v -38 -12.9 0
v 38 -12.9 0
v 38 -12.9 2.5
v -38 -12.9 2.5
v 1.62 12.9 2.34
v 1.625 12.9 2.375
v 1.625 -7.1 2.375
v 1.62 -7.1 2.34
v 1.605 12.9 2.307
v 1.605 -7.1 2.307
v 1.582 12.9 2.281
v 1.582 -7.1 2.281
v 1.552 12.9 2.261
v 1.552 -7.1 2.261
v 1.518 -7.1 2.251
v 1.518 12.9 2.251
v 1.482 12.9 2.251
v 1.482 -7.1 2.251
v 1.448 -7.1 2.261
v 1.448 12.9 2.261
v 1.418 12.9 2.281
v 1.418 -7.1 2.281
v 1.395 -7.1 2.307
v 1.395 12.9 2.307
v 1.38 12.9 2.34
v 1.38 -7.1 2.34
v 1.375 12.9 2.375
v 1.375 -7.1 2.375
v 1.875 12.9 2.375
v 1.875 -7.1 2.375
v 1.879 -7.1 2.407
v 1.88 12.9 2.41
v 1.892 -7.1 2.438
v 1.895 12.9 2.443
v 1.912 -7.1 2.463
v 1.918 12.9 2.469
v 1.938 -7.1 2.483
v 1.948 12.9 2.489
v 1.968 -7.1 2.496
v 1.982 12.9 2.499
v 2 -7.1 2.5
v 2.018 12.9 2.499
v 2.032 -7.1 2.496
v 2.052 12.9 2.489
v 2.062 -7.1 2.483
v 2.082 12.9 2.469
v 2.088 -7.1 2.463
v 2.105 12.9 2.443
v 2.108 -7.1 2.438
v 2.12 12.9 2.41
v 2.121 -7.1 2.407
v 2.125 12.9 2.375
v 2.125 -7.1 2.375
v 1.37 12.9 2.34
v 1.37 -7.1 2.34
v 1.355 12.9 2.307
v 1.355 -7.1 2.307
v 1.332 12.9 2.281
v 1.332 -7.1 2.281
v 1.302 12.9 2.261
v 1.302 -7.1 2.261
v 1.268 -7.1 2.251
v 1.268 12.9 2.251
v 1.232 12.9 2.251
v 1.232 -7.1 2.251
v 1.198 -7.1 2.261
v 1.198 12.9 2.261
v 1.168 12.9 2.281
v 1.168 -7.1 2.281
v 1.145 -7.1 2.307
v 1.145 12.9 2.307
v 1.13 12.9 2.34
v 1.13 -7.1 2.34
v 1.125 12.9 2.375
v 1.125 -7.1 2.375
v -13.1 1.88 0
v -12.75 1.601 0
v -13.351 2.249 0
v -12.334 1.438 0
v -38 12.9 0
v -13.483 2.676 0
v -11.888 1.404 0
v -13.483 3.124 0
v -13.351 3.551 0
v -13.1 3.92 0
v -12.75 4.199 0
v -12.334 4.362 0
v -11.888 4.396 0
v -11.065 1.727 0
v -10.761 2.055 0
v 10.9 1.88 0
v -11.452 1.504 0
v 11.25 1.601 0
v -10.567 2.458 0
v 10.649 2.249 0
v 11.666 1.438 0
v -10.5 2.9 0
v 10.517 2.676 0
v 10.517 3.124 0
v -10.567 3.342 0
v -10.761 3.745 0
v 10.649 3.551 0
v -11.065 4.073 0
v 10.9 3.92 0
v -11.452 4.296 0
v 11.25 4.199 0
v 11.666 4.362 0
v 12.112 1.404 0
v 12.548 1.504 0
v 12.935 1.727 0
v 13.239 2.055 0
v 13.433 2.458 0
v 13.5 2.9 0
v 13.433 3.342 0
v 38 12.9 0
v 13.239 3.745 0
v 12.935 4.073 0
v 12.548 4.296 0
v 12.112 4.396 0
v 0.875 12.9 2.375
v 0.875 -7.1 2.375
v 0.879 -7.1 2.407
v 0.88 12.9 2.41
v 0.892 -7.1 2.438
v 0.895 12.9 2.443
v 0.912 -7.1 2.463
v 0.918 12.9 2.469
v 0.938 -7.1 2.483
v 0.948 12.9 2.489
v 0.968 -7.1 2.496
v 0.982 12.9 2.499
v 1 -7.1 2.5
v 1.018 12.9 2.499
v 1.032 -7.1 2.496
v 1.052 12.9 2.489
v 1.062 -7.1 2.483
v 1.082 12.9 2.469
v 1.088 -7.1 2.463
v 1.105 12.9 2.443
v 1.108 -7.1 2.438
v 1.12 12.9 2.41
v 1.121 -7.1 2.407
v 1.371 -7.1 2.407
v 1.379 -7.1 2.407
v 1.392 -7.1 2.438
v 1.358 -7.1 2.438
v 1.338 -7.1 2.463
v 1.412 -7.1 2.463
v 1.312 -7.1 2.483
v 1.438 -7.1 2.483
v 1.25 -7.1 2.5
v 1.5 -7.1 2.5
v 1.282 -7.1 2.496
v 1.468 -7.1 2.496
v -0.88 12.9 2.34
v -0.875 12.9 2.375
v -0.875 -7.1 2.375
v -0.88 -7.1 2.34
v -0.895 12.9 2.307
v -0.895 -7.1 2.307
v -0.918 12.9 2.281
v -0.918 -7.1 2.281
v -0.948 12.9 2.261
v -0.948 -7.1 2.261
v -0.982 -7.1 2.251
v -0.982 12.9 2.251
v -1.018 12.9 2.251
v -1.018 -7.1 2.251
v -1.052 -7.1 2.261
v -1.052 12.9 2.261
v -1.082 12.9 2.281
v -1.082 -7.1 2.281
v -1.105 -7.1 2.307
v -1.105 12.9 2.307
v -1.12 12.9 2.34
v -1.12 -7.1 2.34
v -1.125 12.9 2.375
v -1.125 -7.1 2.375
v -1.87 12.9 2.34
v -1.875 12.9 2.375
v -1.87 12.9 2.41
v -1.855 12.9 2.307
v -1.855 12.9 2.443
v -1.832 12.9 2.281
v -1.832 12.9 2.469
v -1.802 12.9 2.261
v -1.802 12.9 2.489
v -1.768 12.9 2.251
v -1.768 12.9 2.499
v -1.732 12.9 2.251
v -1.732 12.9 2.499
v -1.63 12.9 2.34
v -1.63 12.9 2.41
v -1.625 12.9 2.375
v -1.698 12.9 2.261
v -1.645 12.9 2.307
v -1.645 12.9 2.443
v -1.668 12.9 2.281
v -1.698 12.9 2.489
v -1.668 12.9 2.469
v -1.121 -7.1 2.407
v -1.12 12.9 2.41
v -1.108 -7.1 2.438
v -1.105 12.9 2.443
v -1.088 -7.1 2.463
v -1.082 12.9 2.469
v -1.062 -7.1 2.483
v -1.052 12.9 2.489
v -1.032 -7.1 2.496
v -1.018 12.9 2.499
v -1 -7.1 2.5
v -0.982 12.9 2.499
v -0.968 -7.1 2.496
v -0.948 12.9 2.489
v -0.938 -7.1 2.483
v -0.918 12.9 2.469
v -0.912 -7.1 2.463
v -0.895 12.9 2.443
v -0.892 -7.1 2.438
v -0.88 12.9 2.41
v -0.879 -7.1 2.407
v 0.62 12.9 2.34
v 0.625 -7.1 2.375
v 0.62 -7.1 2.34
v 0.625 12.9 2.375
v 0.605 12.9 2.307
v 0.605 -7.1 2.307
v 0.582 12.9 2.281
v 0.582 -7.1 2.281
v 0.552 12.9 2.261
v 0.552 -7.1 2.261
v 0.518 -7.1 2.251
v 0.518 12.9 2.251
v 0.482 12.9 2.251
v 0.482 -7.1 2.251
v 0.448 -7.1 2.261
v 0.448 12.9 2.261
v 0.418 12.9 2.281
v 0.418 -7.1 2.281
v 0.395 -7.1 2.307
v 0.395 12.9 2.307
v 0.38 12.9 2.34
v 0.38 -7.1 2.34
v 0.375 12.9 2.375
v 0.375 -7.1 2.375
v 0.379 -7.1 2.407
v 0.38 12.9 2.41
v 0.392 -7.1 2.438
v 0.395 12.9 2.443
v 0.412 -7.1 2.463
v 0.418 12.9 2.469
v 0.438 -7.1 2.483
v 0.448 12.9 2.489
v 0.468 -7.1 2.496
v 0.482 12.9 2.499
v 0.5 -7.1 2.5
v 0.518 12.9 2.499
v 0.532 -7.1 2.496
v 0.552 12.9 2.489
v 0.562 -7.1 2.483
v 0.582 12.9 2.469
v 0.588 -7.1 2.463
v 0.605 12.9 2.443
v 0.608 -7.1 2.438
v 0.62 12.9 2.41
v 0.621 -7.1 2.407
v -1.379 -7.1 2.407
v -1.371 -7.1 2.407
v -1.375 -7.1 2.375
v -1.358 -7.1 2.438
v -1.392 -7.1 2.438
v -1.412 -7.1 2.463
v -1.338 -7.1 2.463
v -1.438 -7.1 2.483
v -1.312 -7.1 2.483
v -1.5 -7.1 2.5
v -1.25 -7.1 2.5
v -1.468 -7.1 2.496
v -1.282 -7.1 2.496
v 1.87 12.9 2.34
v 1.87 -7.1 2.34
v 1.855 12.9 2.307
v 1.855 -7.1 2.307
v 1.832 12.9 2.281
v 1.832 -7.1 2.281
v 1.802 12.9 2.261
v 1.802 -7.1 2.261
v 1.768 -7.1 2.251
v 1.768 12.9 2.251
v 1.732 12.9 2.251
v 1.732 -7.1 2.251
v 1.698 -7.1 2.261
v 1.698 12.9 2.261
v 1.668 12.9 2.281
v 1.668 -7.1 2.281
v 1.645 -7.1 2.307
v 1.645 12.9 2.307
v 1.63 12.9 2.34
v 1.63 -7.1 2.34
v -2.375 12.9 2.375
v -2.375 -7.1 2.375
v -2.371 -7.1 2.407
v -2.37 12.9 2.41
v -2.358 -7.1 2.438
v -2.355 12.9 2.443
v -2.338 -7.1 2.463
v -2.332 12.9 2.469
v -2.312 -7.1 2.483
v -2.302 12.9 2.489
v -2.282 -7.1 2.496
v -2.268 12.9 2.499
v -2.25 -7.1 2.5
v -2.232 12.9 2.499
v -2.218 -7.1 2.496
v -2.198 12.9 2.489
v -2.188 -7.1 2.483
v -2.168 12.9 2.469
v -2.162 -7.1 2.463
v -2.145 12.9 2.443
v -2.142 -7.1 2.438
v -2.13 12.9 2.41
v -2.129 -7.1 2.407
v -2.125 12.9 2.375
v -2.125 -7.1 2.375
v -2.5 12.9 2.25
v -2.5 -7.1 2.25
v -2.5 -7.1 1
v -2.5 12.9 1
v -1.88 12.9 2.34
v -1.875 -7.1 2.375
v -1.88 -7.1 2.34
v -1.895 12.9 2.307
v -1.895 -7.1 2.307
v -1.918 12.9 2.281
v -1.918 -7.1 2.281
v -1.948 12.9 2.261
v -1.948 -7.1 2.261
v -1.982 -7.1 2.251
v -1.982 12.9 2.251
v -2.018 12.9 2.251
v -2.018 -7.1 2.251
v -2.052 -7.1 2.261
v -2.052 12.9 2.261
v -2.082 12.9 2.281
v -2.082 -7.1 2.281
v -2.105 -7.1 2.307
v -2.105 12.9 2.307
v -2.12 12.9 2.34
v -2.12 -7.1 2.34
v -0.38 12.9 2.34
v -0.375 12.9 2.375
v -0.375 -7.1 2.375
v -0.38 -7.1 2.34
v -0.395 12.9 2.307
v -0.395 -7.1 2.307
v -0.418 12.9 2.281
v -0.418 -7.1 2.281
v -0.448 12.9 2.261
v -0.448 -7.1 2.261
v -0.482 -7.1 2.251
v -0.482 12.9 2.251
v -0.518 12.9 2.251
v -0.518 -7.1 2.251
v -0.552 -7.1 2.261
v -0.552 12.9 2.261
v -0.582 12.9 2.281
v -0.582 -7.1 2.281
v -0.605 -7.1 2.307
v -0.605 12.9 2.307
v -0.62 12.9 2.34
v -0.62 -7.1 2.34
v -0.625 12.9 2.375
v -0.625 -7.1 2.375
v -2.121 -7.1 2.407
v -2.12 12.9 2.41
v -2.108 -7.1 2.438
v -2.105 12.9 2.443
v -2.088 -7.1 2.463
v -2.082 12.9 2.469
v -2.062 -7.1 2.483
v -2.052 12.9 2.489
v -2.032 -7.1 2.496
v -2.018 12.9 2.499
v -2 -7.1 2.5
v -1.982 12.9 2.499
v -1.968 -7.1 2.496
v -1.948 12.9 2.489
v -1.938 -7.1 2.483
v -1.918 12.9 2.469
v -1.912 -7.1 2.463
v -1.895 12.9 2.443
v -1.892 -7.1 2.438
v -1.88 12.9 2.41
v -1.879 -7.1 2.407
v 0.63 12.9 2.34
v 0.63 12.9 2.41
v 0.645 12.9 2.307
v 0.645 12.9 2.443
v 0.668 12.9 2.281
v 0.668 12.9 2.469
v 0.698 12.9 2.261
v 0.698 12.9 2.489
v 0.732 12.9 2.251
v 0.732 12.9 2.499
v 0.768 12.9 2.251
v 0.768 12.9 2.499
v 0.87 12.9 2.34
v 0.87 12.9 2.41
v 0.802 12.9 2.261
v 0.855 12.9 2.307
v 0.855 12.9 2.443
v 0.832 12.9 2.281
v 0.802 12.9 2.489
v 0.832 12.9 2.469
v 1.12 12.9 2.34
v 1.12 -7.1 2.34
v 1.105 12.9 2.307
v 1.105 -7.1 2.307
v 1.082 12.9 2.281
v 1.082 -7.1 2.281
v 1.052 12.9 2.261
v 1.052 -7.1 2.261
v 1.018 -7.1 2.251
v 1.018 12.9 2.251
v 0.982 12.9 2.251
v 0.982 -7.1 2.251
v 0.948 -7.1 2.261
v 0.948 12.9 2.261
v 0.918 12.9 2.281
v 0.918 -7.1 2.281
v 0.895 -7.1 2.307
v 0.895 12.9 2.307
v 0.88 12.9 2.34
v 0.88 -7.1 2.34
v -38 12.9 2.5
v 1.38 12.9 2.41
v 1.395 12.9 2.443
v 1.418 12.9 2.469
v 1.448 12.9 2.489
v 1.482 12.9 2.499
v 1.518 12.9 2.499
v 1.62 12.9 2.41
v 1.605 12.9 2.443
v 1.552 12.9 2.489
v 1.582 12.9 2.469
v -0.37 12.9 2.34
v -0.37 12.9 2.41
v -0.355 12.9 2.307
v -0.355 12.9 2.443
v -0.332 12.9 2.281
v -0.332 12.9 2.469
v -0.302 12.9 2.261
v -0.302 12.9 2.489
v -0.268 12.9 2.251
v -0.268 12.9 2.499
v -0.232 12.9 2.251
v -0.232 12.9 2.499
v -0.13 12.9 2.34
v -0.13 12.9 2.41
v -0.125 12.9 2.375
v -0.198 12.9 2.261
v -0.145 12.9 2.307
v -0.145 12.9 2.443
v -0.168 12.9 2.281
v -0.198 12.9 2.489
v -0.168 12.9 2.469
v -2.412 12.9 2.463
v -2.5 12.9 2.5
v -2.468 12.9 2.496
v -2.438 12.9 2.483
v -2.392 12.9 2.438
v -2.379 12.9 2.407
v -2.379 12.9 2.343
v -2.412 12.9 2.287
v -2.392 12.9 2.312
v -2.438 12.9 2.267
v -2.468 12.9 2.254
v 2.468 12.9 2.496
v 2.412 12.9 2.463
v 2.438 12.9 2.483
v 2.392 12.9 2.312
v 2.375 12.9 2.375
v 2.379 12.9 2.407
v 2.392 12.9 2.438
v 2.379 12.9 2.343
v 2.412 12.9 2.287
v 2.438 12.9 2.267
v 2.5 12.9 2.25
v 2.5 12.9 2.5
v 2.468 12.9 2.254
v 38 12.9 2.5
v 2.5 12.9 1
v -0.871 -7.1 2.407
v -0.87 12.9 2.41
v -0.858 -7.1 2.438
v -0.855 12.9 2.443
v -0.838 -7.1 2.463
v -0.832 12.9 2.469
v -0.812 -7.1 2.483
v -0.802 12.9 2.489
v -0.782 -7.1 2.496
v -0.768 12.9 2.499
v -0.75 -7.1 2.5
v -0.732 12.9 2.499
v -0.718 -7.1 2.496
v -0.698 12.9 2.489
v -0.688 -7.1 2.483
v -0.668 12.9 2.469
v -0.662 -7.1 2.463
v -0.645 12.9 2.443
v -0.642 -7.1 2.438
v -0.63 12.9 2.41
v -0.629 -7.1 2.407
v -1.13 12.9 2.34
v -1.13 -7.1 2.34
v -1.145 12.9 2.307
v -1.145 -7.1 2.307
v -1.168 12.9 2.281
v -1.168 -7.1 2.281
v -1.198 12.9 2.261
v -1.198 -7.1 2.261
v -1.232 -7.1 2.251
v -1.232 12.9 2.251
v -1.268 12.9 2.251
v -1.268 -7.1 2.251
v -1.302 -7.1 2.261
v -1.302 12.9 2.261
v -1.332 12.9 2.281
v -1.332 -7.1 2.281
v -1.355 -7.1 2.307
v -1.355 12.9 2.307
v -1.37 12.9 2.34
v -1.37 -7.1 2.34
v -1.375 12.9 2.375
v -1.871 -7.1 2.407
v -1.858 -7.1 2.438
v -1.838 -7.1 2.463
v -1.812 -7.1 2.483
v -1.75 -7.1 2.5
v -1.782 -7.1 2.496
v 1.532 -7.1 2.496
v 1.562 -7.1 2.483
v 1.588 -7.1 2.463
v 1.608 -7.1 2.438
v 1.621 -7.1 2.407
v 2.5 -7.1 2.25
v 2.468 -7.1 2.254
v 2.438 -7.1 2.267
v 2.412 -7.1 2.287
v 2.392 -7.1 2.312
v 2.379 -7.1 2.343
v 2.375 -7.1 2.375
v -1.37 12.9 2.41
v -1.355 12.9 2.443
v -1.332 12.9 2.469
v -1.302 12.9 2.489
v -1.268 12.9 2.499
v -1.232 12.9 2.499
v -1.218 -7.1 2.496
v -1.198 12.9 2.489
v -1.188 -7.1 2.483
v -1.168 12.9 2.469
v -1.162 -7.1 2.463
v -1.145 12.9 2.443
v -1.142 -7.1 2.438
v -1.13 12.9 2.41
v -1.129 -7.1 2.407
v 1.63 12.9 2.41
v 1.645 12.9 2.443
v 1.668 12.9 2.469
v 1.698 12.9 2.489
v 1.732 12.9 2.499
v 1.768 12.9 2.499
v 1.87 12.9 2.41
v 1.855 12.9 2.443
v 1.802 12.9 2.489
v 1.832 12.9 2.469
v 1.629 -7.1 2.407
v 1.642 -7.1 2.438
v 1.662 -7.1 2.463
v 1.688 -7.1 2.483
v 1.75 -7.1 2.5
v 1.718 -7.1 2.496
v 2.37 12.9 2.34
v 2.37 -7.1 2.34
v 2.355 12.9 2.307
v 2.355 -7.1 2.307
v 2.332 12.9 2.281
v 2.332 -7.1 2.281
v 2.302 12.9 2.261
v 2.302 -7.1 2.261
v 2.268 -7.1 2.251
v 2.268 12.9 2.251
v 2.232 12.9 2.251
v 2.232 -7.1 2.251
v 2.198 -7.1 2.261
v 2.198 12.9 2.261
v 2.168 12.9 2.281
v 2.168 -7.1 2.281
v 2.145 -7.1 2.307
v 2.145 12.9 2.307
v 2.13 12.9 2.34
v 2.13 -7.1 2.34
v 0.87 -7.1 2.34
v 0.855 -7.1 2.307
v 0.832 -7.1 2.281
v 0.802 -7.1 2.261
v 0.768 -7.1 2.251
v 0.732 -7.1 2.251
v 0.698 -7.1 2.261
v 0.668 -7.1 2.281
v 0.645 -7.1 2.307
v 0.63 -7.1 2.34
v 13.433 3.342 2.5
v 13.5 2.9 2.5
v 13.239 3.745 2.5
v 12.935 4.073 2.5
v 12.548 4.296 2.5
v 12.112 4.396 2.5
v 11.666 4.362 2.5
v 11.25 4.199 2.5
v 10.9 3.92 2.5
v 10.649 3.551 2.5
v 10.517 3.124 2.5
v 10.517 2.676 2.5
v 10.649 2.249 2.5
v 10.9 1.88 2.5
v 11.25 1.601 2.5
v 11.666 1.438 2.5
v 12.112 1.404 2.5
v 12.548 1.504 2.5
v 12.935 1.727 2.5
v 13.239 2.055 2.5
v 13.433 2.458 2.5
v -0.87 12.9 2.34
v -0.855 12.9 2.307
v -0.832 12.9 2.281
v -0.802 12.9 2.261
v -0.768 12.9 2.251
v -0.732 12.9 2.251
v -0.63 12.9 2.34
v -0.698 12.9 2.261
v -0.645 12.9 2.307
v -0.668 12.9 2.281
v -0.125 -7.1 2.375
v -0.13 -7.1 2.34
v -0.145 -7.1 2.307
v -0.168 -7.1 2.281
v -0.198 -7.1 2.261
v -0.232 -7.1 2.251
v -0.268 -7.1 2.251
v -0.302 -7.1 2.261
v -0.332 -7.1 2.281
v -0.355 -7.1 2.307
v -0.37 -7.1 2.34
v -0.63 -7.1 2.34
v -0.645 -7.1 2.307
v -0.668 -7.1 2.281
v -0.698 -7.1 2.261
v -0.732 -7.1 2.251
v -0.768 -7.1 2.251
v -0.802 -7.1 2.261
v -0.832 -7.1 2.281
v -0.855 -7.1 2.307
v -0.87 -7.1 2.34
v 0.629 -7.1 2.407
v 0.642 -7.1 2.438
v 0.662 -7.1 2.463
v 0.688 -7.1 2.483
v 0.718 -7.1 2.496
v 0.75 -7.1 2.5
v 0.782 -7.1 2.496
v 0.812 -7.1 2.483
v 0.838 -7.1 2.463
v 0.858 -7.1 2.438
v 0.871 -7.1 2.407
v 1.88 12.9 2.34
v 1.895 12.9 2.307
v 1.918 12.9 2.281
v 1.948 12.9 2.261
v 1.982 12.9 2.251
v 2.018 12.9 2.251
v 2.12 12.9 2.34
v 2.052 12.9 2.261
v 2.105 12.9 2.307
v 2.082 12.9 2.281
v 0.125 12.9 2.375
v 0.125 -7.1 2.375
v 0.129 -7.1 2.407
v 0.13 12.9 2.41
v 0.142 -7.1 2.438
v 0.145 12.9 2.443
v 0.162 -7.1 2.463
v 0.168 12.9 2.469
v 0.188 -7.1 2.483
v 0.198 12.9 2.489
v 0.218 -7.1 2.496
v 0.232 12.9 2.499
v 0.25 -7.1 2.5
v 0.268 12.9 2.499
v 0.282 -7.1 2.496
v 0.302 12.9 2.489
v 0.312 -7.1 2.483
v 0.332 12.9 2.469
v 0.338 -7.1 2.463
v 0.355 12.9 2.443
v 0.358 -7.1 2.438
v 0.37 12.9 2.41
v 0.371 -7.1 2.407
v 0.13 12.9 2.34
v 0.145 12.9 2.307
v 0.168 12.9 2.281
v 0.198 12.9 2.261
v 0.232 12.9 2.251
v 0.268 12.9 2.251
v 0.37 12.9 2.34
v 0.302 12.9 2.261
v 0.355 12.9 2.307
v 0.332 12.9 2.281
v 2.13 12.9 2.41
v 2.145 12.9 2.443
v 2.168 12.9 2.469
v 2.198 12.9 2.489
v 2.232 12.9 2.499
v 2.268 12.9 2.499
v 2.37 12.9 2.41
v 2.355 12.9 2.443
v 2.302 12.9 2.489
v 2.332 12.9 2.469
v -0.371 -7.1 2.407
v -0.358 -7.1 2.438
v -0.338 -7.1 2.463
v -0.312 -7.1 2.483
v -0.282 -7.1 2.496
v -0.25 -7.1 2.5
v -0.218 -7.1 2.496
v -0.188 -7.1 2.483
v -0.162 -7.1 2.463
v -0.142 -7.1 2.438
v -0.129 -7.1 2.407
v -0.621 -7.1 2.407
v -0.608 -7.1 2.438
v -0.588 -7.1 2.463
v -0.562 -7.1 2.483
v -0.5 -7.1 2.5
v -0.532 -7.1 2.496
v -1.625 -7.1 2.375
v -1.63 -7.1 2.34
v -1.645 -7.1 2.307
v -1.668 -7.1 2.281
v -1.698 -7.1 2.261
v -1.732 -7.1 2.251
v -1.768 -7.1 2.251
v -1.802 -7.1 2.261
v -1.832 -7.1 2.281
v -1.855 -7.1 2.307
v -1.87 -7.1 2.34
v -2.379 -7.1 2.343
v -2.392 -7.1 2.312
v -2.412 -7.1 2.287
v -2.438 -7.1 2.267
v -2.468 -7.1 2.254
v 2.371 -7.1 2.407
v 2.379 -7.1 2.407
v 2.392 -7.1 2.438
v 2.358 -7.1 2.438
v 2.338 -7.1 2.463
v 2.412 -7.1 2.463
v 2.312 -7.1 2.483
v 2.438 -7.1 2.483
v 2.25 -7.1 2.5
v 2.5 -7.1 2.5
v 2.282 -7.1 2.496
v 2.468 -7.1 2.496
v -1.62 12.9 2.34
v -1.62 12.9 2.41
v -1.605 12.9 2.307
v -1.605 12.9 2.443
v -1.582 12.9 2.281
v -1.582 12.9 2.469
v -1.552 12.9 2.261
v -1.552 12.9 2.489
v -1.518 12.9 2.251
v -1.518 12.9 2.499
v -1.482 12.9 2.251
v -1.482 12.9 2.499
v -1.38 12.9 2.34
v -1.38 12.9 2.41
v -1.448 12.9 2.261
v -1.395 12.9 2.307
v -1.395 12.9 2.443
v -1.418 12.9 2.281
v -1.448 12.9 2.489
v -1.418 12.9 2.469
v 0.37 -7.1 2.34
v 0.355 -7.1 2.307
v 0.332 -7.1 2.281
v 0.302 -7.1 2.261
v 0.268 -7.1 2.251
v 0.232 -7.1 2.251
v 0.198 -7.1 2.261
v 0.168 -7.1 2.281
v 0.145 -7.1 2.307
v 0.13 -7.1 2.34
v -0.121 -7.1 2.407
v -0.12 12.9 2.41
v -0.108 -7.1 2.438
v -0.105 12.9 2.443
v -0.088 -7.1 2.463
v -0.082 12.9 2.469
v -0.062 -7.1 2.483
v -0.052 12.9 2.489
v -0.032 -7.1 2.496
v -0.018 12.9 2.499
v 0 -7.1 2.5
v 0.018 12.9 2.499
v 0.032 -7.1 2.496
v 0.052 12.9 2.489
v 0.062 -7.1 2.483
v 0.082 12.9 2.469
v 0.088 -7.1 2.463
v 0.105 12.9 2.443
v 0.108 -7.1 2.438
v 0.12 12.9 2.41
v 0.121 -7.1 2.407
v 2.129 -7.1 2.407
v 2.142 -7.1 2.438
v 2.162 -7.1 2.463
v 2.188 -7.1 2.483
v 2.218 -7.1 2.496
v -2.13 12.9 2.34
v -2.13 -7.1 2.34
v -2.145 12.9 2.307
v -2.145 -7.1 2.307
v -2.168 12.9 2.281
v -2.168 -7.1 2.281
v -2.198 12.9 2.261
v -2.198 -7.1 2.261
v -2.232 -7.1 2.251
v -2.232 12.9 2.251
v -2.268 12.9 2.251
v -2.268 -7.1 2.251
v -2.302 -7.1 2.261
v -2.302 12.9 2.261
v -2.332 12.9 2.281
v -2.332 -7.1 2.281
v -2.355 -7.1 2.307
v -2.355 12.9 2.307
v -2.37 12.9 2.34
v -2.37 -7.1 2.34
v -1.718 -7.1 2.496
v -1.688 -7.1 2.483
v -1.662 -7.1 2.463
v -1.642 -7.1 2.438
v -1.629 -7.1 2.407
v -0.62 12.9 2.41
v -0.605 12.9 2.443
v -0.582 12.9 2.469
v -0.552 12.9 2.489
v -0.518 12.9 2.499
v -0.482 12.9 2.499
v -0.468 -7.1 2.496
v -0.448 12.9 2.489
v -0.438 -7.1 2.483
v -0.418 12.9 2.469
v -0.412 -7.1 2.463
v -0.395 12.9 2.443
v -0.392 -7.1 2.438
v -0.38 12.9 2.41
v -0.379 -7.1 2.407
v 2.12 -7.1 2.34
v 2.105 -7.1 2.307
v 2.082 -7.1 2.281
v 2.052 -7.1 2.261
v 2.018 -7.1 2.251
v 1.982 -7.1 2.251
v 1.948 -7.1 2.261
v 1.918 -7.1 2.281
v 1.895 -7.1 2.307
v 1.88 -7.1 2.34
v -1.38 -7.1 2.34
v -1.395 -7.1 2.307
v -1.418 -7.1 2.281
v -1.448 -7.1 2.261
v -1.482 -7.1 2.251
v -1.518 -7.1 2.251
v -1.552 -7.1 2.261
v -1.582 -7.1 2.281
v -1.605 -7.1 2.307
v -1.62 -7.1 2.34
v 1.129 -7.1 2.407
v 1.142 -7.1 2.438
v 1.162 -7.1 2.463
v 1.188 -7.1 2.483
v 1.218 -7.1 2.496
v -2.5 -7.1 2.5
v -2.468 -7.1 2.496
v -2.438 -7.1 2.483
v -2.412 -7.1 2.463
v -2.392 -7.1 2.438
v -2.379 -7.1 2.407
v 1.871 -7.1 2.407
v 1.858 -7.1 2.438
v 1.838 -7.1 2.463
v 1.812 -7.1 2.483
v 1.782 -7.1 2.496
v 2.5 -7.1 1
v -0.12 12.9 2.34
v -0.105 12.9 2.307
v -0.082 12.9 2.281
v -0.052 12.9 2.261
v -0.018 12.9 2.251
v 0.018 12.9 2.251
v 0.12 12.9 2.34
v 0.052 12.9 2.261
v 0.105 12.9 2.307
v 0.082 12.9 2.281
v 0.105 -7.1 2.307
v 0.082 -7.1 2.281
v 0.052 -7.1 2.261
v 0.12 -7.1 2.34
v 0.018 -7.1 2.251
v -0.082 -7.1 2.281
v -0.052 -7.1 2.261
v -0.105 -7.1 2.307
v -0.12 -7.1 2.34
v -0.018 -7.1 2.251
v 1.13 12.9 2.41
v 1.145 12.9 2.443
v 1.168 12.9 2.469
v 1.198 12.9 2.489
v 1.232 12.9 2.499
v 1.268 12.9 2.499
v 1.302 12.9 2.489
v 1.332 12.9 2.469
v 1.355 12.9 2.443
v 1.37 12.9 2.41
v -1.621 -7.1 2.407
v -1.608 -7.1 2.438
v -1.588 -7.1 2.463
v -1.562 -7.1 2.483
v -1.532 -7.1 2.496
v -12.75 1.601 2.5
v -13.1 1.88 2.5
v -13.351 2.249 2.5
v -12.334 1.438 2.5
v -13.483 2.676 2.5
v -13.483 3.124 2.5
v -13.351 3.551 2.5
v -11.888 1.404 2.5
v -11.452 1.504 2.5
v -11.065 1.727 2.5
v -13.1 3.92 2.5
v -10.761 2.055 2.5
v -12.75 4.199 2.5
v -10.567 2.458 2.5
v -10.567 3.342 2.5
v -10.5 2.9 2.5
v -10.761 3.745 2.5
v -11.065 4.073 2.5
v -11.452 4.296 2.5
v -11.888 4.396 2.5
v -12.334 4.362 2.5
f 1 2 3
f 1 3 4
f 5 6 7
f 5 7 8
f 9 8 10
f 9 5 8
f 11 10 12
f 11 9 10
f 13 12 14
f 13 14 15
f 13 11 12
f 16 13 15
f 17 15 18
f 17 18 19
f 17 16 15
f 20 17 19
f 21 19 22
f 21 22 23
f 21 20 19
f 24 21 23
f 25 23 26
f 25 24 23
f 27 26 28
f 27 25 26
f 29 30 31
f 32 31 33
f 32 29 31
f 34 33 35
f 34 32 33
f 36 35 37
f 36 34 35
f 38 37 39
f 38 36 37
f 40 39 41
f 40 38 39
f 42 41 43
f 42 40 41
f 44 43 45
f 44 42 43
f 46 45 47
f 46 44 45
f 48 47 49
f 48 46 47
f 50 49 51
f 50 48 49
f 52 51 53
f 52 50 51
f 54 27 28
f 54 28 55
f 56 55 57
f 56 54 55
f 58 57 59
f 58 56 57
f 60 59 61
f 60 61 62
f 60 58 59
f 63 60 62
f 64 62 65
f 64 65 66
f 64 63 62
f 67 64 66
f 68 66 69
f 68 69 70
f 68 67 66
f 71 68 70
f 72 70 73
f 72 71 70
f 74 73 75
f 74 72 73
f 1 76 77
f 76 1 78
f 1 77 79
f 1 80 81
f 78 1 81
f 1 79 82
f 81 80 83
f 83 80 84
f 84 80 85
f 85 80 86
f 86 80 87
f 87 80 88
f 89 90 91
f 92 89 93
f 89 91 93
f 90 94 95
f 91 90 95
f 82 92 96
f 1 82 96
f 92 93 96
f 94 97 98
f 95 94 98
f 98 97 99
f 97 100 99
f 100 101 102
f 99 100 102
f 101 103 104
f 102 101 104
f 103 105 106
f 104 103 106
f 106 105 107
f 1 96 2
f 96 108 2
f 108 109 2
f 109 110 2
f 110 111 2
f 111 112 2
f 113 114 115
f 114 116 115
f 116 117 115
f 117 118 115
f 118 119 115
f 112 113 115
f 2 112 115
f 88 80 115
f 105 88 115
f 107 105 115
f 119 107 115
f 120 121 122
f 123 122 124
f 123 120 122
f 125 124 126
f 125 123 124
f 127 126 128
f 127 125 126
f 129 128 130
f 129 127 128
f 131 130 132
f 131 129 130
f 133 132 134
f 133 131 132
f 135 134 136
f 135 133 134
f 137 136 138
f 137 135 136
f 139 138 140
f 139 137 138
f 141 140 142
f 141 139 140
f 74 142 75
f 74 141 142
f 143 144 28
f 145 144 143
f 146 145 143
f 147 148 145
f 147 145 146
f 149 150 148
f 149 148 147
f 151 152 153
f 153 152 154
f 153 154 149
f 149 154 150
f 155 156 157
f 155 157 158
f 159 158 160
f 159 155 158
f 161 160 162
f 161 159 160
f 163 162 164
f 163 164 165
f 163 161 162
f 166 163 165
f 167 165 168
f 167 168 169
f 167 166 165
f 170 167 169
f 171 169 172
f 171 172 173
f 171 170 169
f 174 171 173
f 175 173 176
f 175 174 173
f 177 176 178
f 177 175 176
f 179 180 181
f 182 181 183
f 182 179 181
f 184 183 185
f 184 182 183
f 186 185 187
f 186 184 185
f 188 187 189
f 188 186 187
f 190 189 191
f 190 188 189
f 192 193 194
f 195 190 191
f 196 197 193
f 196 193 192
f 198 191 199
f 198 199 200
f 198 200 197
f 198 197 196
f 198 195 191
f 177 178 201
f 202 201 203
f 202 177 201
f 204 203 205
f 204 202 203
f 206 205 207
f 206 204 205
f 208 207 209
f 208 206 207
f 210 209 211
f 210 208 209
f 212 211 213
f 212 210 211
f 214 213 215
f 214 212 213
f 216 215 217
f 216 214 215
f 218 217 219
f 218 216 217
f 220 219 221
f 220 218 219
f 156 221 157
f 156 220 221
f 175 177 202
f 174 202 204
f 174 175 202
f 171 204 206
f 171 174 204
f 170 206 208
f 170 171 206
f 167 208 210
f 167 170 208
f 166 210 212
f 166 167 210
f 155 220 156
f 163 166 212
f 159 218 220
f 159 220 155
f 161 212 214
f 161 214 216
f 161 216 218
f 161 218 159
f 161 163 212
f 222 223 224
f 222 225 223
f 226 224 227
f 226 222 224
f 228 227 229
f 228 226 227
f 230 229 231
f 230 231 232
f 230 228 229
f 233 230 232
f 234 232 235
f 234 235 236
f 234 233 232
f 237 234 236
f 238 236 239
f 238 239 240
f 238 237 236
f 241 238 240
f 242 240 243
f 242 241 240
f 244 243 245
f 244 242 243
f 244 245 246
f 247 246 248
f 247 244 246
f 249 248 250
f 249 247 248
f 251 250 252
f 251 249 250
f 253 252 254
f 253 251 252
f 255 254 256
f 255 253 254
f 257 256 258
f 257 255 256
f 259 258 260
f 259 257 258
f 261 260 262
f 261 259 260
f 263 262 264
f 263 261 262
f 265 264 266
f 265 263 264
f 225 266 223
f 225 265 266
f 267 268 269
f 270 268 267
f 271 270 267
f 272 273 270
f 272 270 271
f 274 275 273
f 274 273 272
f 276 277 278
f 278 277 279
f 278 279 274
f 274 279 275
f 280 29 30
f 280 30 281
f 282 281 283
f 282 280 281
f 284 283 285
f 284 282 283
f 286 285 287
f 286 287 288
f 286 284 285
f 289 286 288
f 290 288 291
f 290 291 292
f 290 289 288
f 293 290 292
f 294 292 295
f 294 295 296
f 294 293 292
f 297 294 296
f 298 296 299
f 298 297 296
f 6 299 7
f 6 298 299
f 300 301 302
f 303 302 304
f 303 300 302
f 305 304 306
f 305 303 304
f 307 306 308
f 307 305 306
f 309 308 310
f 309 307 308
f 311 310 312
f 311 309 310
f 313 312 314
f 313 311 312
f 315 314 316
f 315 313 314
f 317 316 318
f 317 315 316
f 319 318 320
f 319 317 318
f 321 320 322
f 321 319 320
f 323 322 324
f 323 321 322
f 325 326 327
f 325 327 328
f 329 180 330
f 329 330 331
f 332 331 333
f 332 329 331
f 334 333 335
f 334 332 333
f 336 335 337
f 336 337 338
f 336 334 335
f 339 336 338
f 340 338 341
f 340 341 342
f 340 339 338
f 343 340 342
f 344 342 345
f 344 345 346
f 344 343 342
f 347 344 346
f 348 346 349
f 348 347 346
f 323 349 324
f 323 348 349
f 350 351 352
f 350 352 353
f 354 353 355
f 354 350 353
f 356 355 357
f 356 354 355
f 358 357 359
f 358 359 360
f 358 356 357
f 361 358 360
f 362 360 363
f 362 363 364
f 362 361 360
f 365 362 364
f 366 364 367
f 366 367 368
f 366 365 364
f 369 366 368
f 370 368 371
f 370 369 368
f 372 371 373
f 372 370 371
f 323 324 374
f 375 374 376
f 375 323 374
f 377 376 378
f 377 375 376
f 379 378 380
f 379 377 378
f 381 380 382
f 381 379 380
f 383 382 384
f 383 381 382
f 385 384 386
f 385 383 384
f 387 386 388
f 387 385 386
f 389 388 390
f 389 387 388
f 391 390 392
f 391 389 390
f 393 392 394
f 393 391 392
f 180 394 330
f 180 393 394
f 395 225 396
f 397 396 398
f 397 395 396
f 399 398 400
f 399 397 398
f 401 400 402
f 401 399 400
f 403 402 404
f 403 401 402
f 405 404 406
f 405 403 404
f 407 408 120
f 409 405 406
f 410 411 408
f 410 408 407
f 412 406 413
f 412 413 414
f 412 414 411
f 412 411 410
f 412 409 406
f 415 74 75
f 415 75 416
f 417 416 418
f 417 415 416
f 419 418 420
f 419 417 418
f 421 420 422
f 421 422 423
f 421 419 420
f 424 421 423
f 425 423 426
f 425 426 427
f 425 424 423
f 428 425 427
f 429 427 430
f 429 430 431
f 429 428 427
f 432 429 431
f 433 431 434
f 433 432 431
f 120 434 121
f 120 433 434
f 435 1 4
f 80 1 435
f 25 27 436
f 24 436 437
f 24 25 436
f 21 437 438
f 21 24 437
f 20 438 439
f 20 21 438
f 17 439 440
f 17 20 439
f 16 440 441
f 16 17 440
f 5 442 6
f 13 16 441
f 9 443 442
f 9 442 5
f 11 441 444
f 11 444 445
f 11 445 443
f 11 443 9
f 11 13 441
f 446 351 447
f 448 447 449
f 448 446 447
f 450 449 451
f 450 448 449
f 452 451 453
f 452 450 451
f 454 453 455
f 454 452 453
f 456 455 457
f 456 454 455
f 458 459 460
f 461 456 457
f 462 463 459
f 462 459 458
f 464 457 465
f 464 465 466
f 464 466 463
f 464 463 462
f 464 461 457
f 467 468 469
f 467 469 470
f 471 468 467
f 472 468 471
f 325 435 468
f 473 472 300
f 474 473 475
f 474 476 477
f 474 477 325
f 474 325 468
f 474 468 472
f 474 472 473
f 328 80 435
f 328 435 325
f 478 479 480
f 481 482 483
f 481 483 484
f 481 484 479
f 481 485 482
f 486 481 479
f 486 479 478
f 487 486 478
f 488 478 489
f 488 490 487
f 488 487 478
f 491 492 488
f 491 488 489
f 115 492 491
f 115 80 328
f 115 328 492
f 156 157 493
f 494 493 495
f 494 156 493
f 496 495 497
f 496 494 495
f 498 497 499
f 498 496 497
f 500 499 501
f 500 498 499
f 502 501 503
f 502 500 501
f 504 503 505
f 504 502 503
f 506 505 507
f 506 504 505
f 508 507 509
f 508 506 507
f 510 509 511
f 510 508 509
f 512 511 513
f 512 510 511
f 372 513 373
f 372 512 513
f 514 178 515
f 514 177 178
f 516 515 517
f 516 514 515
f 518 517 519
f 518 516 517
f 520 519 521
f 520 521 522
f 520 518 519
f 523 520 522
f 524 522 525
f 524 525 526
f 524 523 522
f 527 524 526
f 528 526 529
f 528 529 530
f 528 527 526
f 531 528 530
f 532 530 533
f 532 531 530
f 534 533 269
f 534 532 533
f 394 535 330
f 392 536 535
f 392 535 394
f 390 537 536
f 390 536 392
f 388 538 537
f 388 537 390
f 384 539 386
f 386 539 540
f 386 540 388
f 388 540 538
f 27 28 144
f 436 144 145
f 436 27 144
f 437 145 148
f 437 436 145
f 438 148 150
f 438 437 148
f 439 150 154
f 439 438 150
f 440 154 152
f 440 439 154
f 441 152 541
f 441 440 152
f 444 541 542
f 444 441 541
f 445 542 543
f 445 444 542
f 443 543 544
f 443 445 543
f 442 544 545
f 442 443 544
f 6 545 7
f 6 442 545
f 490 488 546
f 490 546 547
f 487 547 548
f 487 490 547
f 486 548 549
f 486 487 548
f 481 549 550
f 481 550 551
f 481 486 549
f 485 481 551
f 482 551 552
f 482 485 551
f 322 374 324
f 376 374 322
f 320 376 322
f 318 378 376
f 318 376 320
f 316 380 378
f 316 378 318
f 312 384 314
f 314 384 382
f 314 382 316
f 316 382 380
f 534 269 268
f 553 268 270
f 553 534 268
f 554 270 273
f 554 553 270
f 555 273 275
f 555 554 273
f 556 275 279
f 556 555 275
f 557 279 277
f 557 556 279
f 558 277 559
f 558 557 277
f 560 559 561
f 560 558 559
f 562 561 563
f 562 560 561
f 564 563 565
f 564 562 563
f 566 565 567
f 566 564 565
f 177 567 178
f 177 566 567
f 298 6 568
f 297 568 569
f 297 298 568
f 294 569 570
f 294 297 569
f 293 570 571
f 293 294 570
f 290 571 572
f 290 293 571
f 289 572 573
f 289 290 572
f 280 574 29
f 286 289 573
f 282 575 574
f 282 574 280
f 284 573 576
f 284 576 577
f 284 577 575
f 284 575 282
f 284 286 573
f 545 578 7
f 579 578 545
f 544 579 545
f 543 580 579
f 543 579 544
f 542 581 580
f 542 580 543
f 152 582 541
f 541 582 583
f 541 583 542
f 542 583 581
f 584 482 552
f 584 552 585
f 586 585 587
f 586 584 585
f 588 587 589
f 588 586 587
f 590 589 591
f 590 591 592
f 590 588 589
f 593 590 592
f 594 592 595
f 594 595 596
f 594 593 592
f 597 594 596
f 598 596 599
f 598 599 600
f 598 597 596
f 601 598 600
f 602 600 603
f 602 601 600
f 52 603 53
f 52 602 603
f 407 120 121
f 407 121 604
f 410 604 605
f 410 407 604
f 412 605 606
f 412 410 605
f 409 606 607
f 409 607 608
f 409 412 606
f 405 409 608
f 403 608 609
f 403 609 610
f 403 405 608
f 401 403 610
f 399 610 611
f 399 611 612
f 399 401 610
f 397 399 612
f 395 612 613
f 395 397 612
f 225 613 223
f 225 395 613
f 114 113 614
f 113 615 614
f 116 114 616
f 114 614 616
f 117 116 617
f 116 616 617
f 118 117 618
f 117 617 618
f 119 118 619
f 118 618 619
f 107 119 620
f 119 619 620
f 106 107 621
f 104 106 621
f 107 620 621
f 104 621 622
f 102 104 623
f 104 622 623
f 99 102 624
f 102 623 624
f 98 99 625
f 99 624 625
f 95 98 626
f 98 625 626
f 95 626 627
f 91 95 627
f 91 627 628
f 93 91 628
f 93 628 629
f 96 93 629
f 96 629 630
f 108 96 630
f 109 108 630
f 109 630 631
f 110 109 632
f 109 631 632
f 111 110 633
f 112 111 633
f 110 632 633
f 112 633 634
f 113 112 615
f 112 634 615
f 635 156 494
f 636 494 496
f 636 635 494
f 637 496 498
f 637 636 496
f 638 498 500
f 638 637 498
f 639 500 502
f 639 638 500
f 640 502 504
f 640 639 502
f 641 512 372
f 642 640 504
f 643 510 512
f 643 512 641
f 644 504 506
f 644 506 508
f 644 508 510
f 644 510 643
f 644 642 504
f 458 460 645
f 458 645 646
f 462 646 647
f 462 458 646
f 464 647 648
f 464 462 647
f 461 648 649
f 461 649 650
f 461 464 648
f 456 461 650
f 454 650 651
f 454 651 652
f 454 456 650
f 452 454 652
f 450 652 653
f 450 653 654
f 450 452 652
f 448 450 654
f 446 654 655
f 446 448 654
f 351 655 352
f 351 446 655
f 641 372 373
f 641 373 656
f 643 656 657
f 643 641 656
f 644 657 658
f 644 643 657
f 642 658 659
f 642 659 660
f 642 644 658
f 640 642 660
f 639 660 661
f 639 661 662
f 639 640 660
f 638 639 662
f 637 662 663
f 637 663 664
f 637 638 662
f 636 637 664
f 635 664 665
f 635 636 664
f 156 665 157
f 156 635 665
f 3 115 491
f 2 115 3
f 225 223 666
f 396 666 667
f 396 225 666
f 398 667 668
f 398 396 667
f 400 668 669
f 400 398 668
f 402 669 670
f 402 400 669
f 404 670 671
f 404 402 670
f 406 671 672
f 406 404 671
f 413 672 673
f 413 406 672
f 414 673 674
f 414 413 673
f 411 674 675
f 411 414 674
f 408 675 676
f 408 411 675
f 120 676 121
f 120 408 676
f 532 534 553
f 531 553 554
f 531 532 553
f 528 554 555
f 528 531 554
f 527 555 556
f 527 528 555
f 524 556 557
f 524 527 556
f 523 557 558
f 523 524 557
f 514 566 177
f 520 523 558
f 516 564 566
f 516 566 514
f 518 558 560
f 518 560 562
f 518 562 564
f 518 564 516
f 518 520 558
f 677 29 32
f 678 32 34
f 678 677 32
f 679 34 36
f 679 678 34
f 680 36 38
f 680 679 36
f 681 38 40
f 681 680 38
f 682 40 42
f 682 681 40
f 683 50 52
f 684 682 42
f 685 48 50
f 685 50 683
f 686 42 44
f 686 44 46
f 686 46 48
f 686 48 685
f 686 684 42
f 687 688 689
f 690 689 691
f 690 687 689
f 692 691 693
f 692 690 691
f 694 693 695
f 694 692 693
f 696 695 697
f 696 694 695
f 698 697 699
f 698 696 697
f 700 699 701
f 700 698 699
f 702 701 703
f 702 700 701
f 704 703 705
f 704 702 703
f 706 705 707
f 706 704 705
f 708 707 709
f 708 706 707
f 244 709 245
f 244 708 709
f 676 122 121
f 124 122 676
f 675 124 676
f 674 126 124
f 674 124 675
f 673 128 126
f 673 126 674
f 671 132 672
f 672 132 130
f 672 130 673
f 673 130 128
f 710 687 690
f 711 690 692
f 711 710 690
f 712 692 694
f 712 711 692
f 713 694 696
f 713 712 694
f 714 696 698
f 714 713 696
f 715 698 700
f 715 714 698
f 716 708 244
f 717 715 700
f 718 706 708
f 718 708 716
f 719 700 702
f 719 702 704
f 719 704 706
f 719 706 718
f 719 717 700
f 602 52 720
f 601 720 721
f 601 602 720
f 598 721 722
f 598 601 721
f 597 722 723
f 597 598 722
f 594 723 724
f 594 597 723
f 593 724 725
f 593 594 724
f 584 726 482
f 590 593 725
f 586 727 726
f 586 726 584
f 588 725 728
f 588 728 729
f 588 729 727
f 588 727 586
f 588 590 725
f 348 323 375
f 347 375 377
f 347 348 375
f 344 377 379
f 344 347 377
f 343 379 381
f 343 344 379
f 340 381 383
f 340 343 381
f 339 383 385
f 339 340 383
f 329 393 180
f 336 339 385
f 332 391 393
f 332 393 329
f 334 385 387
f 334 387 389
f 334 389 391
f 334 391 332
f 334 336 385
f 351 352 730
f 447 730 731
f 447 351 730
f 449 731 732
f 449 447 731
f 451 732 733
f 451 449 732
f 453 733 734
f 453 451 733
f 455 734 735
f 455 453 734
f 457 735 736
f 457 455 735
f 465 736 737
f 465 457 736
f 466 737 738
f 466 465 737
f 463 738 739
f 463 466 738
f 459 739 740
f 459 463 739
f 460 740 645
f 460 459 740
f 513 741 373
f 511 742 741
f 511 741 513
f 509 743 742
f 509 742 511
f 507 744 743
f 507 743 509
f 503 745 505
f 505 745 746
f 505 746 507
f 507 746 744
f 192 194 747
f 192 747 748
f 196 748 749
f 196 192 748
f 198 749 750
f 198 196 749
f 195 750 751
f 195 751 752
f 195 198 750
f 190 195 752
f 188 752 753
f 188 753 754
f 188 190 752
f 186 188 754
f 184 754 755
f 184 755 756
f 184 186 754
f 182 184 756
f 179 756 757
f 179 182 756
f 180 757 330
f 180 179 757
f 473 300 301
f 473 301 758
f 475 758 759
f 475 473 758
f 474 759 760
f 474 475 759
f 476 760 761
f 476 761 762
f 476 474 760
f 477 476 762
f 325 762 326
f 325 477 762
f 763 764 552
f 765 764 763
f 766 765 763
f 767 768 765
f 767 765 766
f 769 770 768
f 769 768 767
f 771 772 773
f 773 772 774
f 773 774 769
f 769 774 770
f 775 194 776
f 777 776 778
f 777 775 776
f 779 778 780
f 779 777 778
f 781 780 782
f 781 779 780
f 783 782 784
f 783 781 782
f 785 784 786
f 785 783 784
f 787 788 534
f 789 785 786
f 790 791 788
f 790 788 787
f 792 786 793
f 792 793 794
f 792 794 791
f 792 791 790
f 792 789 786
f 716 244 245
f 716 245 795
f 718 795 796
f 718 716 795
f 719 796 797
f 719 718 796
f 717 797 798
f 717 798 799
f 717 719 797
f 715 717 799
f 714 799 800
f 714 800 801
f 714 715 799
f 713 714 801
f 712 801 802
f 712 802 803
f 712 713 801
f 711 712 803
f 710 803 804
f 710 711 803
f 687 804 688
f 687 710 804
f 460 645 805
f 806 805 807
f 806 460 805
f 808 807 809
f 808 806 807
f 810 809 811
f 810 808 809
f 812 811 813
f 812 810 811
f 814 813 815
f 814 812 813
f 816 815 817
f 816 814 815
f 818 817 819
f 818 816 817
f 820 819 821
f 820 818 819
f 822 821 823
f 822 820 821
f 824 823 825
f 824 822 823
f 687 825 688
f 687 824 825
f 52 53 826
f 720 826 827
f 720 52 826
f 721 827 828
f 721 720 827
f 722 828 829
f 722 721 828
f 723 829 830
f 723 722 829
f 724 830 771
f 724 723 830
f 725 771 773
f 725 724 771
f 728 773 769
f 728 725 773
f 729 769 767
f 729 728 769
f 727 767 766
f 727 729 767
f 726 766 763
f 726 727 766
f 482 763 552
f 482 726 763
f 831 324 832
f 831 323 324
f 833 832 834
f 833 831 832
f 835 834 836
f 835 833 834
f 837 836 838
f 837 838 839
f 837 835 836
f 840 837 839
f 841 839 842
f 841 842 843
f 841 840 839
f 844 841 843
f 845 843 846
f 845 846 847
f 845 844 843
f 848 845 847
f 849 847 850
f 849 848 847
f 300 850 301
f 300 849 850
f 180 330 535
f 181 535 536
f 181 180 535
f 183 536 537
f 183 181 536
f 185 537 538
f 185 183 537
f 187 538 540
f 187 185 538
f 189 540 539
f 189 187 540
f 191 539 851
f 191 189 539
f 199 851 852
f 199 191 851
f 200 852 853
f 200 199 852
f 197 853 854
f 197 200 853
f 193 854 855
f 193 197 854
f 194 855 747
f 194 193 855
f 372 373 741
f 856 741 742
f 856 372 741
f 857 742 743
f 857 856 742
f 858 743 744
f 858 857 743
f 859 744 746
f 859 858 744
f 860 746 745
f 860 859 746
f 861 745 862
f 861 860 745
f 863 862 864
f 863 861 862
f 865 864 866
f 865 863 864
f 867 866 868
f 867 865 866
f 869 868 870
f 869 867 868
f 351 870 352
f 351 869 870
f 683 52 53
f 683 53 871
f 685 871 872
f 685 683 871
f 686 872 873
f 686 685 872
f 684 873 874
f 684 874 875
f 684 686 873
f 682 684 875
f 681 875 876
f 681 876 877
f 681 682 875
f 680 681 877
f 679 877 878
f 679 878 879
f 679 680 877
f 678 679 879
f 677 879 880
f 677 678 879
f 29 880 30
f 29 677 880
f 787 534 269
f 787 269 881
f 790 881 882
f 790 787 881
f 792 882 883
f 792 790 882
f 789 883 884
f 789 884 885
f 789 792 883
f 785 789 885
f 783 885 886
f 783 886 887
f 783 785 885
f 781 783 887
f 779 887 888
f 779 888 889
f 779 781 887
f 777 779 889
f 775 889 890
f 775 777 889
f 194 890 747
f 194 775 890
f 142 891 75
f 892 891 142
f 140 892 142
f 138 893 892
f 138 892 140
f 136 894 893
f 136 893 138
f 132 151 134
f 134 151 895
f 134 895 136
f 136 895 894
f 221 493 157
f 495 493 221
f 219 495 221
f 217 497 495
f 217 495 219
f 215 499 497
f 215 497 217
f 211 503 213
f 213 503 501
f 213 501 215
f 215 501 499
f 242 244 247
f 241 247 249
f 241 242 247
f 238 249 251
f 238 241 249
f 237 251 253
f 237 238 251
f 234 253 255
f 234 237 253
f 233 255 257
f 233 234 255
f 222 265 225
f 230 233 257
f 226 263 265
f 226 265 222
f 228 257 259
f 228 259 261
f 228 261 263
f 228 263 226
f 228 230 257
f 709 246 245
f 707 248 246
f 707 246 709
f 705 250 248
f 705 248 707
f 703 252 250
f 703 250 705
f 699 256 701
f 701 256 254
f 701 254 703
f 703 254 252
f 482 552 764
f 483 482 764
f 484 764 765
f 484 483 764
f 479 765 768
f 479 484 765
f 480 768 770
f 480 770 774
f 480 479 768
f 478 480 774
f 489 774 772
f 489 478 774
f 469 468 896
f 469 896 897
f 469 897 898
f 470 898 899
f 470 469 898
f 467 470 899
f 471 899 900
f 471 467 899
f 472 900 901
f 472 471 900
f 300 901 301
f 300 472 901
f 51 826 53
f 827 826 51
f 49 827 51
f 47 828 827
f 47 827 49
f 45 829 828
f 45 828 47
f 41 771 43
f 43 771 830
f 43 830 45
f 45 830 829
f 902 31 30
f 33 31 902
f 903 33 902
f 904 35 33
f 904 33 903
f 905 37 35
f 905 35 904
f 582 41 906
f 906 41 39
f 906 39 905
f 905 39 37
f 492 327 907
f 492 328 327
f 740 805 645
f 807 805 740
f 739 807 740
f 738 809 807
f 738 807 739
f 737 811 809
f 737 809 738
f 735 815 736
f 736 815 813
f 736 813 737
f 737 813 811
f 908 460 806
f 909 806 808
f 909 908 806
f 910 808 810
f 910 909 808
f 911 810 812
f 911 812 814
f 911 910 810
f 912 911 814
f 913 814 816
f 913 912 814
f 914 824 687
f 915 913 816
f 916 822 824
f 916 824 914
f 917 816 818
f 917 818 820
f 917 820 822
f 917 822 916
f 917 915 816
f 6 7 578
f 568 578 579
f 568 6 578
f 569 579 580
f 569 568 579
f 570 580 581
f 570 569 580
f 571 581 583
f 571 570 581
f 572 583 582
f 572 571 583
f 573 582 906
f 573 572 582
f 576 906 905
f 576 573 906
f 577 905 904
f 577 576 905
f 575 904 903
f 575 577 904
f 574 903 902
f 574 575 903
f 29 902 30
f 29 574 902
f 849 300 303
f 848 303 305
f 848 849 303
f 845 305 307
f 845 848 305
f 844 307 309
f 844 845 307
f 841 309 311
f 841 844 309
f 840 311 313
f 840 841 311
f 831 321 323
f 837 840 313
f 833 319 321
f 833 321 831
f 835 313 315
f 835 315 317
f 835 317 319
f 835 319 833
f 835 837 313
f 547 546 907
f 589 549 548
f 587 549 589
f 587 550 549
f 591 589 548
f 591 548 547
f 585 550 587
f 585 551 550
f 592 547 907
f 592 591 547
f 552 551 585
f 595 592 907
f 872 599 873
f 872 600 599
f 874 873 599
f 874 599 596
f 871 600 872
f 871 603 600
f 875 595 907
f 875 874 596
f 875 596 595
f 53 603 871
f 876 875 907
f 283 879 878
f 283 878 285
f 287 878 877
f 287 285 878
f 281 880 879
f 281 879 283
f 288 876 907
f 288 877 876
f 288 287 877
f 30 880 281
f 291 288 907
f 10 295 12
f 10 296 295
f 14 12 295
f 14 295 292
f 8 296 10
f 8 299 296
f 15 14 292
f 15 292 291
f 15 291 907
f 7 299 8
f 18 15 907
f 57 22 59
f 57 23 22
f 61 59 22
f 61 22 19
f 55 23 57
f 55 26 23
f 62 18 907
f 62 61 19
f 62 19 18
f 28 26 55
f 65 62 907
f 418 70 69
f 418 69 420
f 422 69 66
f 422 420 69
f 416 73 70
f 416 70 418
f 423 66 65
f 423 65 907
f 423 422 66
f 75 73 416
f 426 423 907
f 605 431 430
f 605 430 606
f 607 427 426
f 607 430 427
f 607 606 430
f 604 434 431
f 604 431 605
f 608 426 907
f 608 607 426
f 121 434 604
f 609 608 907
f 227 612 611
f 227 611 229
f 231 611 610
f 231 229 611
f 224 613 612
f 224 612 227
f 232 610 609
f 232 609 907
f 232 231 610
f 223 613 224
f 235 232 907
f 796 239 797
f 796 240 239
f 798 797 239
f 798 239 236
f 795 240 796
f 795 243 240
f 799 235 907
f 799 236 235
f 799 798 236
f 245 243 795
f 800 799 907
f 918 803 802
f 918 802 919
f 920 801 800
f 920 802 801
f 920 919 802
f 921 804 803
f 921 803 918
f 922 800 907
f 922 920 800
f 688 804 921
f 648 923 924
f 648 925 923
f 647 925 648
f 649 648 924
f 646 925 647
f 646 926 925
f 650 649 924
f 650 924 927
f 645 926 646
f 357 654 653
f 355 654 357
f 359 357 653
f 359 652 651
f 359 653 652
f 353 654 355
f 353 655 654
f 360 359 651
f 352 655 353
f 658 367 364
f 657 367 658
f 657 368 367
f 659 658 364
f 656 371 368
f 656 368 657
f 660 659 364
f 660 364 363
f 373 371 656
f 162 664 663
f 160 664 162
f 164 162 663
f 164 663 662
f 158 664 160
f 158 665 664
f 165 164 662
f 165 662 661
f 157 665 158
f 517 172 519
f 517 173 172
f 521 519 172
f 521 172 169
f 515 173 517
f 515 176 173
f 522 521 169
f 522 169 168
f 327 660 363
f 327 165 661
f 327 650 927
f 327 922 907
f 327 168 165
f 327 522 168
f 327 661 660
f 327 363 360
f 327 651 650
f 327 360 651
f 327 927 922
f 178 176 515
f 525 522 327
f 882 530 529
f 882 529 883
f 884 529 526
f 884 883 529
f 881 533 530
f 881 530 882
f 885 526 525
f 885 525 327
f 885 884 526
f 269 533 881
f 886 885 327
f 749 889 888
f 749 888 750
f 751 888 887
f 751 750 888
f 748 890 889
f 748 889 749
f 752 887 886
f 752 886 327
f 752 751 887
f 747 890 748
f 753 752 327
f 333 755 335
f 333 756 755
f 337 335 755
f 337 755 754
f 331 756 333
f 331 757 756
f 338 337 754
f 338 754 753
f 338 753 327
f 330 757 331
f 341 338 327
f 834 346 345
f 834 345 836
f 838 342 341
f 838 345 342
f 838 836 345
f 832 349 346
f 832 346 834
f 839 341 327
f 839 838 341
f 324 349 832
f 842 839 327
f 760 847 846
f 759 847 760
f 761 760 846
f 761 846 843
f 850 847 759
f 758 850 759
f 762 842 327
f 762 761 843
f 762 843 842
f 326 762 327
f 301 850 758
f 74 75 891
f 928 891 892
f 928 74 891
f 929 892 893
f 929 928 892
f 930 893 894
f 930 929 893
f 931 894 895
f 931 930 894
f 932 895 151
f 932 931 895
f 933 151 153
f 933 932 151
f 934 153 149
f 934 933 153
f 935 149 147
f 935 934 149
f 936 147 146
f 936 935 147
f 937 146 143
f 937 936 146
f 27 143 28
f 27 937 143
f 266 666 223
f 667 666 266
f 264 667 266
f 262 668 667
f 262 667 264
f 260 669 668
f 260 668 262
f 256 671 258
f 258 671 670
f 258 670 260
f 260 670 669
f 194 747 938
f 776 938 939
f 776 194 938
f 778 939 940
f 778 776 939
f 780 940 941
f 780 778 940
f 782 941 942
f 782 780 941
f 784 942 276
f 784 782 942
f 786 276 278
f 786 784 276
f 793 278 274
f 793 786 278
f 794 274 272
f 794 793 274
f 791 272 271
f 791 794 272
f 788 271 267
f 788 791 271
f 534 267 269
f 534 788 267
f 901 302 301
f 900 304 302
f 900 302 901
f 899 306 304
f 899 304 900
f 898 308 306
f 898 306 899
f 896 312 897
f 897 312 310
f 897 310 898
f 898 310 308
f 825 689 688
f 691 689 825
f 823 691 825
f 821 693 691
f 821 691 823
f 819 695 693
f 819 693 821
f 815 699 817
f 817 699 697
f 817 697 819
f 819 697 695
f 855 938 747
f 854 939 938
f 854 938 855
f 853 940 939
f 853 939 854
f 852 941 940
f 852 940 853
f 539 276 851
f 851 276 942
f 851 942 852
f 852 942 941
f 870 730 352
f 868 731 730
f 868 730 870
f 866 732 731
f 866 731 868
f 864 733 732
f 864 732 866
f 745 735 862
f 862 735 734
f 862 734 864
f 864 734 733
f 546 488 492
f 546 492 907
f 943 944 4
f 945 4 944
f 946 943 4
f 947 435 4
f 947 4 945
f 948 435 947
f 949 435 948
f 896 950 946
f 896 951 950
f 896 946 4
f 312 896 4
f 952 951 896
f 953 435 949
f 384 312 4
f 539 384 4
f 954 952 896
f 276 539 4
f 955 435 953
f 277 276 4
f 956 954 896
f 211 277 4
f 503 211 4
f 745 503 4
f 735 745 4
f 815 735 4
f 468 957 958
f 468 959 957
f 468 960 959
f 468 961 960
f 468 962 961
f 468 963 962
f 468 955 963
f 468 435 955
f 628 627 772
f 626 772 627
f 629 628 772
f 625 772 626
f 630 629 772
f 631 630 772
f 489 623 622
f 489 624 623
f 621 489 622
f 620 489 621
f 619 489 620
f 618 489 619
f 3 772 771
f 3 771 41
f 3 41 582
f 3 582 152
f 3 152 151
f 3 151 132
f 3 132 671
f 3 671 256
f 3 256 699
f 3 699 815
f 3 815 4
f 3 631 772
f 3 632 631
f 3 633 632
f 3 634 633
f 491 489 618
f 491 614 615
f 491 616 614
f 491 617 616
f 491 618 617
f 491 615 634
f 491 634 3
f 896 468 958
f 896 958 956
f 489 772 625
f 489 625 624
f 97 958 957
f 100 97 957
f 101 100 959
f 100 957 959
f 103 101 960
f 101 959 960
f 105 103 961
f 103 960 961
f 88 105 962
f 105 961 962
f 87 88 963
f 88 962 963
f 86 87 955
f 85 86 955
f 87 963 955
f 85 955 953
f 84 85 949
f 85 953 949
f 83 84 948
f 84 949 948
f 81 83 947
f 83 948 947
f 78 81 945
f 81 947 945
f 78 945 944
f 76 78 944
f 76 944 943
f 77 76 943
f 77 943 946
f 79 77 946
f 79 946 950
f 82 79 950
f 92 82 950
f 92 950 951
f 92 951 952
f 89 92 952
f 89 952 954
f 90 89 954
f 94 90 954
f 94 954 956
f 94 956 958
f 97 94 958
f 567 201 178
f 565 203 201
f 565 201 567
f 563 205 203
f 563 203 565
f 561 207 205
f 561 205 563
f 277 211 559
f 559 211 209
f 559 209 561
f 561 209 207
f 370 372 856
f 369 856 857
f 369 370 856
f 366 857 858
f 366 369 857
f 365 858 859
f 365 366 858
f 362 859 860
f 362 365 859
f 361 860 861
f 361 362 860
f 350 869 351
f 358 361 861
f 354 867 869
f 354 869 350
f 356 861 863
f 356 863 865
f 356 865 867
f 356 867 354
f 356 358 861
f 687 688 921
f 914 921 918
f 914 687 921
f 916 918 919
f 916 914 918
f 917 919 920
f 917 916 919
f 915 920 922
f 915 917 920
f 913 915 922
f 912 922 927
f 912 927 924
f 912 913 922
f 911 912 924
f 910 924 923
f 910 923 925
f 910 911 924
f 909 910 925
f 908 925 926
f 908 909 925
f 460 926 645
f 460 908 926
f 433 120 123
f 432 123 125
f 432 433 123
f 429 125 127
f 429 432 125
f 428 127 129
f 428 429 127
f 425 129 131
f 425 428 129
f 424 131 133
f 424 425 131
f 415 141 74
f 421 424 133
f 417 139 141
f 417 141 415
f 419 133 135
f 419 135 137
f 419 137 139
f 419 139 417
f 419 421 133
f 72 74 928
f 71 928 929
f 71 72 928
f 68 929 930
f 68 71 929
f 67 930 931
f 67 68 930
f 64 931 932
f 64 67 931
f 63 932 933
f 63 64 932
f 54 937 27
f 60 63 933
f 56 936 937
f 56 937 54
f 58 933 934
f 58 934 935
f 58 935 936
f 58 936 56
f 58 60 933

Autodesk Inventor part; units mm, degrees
ref_plane "YZ Plane" through (0, 0, 0) normal (1, 0, 0) x (0, 1, 0)
ref_plane "XZ Plane" through (0, 0, 0) normal (0, 1, 0) x (-1, 0, 0)
ref_plane "XY Plane" through (0, 0, 0) normal (0, 0, 1) x (1, 0, 0)
sketch "Skizze1" plane through (0, 0, 0) normal (0, 0, 1) x (1, 0, 0)
  line L0 (38, -12.9) -> (-38, -12.9)
  line L1 (-38, -12.9) -> (-38, 12.9)
  line L2 (-38, 12.9) -> (38, 12.9)
  line L3 (38, 12.9) -> (38, -12.9)
  line L4 (38, -12.9) -> (-38, 12.9) construction
  line L5 (-38, -12.9) -> (38, 12.9) construction
  point P0 (0, 0)
  dimension "d0" = 76
  dimension "d1" = 25.8
extrude "Extrusion1" add sketch "Skizze1" along normal blind 2.5
sketch "Skizze2" plane through (0, 0, 2.5) normal (0, 0, 1) x (1, 0, 0)
  line L0 (38, 12.9) -> (-38, 12.9) projected
  line L1 (-38, 12.9) -> (-38, -12.9) projected
  line L2 (-38, -12.9) -> (38, -12.9) projected
  line L3 (38, -12.9) -> (38, 12.9) projected
  line L4 (2.5, -7.1) -> (-2.5, -7.1)
  line L5 (-2.5, -7.1) -> (-2.5, 12.9)
  line L6 (-2.5, 12.9) -> (2.5, 12.9)
  line L7 (2.5, 12.9) -> (2.5, -7.1)
  line L8 (2.5, -7.1) -> (-2.5, 12.9) construction
  line L9 (-2.5, -7.1) -> (2.5, 12.9) construction
  point P0 (0, 0)
  point P1 (0, 2.9)
  point P2 (0, 12.9)
  dimension "d4" = 5
  dimension "d5" = 20
extrude "Extrusion2" cut sketch "Skizze2" against normal blind 1.5 contours L7 L4 L5 L0
sketch "Skizze3" plane through (-38, 12.9, 0) normal (0, 1, 0) x (1, 0, 0)
  line L0 (40.5, -2.5) -> (35.5, -2.5) projected
  line L1 (40.5, -2.5) -> (40.5, -1) projected
  line L2 (40.5, -1) -> (35.5, -1) projected
  line L3 (35.5, -2.5) -> (35.5, -1) projected
  circle A0 centre (38, -2.375) radius 0.125
  point P0 (38, 0)
  dimension "d8" = 0.25
extrude "Extrusion3" add sketch "Skizze3" against normal up to surface (20 mm away) contours A0
pattern_linear "Rechteckige Anordnung1" count 11 spacing 0.25 along (-1, 0, 0) count 11 spacing 0.25 along (1, 0, 0) of "Extrusion3"
ref_plane "Arbeitsebene1" through (0, -12.9, 0) normal (1, 0, 0) x (0, 0, -1)
sketch "Skizze4" plane through (0, 0, 2.5) normal (0, 0, 1) x (1, 0, 0)
  line L0 (2.5, 12.9) -> (2.5, -7.1) projected
  line L1 (2.5, -7.1) -> (2.25, -7.1) projected
  line L2 (2.25, -7.1) -> (2, -7.1) projected
  line L3 (2, -7.1) -> (1.75, -7.1) projected
  line L4 (1.75, -7.1) -> (1.5, -7.1) projected
  line L5 (1.5, -7.1) -> (1.25, -7.1) projected
  line L6 (1.25, -7.1) -> (1, -7.1) projected
  line L7 (1, -7.1) -> (0.75, -7.1) projected
  line L8 (0.75, -7.1) -> (0.5, -7.1) projected
  line L9 (0.5, -7.1) -> (0.25, -7.1) projected
  line L10 (0.25, -7.1) -> (0, -7.1) projected
  line L11 (0, -7.1) -> (-0.25, -7.1) projected
  line L12 (-0.25, -7.1) -> (-0.5, -7.1) projected
  line L13 (-0.5, -7.1) -> (-0.75, -7.1) projected
  line L14 (-0.75, -7.1) -> (-1, -7.1) projected
  line L15 (-1, -7.1) -> (-1.25, -7.1) projected
  line L16 (-1.25, -7.1) -> (-1.5, -7.1) projected
  line L17 (-1.5, -7.1) -> (-1.75, -7.1) projected
  line L18 (-1.75, -7.1) -> (-2, -7.1) projected
  line L19 (-2, -7.1) -> (-2.25, -7.1) projected
  line L20 (-2.25, -7.1) -> (-2.5, -7.1) projected
  line L21 (-2.5, -7.1) -> (-2.5, 12.9) projected
  line L22 (-2.5, 12.9) -> (-38, 12.9) projected
  line L23 (-38, 12.9) -> (-38, -12.9) projected
  line L24 (-38, -12.9) -> (38, -12.9) projected
  line L25 (38, -12.9) -> (38, 12.9) projected
  line L26 (38, 12.9) -> (2.5, 12.9) projected
  circle A0 centre (-12, 2.9) radius 1.5
  line L27 (0, 18.06) -> (0, -18.06) projected
  circle A1 centre (12, 2.9) radius 1.5
  point P0 (0, 0)
  dimension "d17" = 3
  dimension "d18" = 12
  dimension "d19" = 10
extrude "Extrusion4" cut sketch "Skizze4" against normal blind 2.5 contours A0 | A1
properties part number "00_chipnano_waveguide_slidsize_modified"
